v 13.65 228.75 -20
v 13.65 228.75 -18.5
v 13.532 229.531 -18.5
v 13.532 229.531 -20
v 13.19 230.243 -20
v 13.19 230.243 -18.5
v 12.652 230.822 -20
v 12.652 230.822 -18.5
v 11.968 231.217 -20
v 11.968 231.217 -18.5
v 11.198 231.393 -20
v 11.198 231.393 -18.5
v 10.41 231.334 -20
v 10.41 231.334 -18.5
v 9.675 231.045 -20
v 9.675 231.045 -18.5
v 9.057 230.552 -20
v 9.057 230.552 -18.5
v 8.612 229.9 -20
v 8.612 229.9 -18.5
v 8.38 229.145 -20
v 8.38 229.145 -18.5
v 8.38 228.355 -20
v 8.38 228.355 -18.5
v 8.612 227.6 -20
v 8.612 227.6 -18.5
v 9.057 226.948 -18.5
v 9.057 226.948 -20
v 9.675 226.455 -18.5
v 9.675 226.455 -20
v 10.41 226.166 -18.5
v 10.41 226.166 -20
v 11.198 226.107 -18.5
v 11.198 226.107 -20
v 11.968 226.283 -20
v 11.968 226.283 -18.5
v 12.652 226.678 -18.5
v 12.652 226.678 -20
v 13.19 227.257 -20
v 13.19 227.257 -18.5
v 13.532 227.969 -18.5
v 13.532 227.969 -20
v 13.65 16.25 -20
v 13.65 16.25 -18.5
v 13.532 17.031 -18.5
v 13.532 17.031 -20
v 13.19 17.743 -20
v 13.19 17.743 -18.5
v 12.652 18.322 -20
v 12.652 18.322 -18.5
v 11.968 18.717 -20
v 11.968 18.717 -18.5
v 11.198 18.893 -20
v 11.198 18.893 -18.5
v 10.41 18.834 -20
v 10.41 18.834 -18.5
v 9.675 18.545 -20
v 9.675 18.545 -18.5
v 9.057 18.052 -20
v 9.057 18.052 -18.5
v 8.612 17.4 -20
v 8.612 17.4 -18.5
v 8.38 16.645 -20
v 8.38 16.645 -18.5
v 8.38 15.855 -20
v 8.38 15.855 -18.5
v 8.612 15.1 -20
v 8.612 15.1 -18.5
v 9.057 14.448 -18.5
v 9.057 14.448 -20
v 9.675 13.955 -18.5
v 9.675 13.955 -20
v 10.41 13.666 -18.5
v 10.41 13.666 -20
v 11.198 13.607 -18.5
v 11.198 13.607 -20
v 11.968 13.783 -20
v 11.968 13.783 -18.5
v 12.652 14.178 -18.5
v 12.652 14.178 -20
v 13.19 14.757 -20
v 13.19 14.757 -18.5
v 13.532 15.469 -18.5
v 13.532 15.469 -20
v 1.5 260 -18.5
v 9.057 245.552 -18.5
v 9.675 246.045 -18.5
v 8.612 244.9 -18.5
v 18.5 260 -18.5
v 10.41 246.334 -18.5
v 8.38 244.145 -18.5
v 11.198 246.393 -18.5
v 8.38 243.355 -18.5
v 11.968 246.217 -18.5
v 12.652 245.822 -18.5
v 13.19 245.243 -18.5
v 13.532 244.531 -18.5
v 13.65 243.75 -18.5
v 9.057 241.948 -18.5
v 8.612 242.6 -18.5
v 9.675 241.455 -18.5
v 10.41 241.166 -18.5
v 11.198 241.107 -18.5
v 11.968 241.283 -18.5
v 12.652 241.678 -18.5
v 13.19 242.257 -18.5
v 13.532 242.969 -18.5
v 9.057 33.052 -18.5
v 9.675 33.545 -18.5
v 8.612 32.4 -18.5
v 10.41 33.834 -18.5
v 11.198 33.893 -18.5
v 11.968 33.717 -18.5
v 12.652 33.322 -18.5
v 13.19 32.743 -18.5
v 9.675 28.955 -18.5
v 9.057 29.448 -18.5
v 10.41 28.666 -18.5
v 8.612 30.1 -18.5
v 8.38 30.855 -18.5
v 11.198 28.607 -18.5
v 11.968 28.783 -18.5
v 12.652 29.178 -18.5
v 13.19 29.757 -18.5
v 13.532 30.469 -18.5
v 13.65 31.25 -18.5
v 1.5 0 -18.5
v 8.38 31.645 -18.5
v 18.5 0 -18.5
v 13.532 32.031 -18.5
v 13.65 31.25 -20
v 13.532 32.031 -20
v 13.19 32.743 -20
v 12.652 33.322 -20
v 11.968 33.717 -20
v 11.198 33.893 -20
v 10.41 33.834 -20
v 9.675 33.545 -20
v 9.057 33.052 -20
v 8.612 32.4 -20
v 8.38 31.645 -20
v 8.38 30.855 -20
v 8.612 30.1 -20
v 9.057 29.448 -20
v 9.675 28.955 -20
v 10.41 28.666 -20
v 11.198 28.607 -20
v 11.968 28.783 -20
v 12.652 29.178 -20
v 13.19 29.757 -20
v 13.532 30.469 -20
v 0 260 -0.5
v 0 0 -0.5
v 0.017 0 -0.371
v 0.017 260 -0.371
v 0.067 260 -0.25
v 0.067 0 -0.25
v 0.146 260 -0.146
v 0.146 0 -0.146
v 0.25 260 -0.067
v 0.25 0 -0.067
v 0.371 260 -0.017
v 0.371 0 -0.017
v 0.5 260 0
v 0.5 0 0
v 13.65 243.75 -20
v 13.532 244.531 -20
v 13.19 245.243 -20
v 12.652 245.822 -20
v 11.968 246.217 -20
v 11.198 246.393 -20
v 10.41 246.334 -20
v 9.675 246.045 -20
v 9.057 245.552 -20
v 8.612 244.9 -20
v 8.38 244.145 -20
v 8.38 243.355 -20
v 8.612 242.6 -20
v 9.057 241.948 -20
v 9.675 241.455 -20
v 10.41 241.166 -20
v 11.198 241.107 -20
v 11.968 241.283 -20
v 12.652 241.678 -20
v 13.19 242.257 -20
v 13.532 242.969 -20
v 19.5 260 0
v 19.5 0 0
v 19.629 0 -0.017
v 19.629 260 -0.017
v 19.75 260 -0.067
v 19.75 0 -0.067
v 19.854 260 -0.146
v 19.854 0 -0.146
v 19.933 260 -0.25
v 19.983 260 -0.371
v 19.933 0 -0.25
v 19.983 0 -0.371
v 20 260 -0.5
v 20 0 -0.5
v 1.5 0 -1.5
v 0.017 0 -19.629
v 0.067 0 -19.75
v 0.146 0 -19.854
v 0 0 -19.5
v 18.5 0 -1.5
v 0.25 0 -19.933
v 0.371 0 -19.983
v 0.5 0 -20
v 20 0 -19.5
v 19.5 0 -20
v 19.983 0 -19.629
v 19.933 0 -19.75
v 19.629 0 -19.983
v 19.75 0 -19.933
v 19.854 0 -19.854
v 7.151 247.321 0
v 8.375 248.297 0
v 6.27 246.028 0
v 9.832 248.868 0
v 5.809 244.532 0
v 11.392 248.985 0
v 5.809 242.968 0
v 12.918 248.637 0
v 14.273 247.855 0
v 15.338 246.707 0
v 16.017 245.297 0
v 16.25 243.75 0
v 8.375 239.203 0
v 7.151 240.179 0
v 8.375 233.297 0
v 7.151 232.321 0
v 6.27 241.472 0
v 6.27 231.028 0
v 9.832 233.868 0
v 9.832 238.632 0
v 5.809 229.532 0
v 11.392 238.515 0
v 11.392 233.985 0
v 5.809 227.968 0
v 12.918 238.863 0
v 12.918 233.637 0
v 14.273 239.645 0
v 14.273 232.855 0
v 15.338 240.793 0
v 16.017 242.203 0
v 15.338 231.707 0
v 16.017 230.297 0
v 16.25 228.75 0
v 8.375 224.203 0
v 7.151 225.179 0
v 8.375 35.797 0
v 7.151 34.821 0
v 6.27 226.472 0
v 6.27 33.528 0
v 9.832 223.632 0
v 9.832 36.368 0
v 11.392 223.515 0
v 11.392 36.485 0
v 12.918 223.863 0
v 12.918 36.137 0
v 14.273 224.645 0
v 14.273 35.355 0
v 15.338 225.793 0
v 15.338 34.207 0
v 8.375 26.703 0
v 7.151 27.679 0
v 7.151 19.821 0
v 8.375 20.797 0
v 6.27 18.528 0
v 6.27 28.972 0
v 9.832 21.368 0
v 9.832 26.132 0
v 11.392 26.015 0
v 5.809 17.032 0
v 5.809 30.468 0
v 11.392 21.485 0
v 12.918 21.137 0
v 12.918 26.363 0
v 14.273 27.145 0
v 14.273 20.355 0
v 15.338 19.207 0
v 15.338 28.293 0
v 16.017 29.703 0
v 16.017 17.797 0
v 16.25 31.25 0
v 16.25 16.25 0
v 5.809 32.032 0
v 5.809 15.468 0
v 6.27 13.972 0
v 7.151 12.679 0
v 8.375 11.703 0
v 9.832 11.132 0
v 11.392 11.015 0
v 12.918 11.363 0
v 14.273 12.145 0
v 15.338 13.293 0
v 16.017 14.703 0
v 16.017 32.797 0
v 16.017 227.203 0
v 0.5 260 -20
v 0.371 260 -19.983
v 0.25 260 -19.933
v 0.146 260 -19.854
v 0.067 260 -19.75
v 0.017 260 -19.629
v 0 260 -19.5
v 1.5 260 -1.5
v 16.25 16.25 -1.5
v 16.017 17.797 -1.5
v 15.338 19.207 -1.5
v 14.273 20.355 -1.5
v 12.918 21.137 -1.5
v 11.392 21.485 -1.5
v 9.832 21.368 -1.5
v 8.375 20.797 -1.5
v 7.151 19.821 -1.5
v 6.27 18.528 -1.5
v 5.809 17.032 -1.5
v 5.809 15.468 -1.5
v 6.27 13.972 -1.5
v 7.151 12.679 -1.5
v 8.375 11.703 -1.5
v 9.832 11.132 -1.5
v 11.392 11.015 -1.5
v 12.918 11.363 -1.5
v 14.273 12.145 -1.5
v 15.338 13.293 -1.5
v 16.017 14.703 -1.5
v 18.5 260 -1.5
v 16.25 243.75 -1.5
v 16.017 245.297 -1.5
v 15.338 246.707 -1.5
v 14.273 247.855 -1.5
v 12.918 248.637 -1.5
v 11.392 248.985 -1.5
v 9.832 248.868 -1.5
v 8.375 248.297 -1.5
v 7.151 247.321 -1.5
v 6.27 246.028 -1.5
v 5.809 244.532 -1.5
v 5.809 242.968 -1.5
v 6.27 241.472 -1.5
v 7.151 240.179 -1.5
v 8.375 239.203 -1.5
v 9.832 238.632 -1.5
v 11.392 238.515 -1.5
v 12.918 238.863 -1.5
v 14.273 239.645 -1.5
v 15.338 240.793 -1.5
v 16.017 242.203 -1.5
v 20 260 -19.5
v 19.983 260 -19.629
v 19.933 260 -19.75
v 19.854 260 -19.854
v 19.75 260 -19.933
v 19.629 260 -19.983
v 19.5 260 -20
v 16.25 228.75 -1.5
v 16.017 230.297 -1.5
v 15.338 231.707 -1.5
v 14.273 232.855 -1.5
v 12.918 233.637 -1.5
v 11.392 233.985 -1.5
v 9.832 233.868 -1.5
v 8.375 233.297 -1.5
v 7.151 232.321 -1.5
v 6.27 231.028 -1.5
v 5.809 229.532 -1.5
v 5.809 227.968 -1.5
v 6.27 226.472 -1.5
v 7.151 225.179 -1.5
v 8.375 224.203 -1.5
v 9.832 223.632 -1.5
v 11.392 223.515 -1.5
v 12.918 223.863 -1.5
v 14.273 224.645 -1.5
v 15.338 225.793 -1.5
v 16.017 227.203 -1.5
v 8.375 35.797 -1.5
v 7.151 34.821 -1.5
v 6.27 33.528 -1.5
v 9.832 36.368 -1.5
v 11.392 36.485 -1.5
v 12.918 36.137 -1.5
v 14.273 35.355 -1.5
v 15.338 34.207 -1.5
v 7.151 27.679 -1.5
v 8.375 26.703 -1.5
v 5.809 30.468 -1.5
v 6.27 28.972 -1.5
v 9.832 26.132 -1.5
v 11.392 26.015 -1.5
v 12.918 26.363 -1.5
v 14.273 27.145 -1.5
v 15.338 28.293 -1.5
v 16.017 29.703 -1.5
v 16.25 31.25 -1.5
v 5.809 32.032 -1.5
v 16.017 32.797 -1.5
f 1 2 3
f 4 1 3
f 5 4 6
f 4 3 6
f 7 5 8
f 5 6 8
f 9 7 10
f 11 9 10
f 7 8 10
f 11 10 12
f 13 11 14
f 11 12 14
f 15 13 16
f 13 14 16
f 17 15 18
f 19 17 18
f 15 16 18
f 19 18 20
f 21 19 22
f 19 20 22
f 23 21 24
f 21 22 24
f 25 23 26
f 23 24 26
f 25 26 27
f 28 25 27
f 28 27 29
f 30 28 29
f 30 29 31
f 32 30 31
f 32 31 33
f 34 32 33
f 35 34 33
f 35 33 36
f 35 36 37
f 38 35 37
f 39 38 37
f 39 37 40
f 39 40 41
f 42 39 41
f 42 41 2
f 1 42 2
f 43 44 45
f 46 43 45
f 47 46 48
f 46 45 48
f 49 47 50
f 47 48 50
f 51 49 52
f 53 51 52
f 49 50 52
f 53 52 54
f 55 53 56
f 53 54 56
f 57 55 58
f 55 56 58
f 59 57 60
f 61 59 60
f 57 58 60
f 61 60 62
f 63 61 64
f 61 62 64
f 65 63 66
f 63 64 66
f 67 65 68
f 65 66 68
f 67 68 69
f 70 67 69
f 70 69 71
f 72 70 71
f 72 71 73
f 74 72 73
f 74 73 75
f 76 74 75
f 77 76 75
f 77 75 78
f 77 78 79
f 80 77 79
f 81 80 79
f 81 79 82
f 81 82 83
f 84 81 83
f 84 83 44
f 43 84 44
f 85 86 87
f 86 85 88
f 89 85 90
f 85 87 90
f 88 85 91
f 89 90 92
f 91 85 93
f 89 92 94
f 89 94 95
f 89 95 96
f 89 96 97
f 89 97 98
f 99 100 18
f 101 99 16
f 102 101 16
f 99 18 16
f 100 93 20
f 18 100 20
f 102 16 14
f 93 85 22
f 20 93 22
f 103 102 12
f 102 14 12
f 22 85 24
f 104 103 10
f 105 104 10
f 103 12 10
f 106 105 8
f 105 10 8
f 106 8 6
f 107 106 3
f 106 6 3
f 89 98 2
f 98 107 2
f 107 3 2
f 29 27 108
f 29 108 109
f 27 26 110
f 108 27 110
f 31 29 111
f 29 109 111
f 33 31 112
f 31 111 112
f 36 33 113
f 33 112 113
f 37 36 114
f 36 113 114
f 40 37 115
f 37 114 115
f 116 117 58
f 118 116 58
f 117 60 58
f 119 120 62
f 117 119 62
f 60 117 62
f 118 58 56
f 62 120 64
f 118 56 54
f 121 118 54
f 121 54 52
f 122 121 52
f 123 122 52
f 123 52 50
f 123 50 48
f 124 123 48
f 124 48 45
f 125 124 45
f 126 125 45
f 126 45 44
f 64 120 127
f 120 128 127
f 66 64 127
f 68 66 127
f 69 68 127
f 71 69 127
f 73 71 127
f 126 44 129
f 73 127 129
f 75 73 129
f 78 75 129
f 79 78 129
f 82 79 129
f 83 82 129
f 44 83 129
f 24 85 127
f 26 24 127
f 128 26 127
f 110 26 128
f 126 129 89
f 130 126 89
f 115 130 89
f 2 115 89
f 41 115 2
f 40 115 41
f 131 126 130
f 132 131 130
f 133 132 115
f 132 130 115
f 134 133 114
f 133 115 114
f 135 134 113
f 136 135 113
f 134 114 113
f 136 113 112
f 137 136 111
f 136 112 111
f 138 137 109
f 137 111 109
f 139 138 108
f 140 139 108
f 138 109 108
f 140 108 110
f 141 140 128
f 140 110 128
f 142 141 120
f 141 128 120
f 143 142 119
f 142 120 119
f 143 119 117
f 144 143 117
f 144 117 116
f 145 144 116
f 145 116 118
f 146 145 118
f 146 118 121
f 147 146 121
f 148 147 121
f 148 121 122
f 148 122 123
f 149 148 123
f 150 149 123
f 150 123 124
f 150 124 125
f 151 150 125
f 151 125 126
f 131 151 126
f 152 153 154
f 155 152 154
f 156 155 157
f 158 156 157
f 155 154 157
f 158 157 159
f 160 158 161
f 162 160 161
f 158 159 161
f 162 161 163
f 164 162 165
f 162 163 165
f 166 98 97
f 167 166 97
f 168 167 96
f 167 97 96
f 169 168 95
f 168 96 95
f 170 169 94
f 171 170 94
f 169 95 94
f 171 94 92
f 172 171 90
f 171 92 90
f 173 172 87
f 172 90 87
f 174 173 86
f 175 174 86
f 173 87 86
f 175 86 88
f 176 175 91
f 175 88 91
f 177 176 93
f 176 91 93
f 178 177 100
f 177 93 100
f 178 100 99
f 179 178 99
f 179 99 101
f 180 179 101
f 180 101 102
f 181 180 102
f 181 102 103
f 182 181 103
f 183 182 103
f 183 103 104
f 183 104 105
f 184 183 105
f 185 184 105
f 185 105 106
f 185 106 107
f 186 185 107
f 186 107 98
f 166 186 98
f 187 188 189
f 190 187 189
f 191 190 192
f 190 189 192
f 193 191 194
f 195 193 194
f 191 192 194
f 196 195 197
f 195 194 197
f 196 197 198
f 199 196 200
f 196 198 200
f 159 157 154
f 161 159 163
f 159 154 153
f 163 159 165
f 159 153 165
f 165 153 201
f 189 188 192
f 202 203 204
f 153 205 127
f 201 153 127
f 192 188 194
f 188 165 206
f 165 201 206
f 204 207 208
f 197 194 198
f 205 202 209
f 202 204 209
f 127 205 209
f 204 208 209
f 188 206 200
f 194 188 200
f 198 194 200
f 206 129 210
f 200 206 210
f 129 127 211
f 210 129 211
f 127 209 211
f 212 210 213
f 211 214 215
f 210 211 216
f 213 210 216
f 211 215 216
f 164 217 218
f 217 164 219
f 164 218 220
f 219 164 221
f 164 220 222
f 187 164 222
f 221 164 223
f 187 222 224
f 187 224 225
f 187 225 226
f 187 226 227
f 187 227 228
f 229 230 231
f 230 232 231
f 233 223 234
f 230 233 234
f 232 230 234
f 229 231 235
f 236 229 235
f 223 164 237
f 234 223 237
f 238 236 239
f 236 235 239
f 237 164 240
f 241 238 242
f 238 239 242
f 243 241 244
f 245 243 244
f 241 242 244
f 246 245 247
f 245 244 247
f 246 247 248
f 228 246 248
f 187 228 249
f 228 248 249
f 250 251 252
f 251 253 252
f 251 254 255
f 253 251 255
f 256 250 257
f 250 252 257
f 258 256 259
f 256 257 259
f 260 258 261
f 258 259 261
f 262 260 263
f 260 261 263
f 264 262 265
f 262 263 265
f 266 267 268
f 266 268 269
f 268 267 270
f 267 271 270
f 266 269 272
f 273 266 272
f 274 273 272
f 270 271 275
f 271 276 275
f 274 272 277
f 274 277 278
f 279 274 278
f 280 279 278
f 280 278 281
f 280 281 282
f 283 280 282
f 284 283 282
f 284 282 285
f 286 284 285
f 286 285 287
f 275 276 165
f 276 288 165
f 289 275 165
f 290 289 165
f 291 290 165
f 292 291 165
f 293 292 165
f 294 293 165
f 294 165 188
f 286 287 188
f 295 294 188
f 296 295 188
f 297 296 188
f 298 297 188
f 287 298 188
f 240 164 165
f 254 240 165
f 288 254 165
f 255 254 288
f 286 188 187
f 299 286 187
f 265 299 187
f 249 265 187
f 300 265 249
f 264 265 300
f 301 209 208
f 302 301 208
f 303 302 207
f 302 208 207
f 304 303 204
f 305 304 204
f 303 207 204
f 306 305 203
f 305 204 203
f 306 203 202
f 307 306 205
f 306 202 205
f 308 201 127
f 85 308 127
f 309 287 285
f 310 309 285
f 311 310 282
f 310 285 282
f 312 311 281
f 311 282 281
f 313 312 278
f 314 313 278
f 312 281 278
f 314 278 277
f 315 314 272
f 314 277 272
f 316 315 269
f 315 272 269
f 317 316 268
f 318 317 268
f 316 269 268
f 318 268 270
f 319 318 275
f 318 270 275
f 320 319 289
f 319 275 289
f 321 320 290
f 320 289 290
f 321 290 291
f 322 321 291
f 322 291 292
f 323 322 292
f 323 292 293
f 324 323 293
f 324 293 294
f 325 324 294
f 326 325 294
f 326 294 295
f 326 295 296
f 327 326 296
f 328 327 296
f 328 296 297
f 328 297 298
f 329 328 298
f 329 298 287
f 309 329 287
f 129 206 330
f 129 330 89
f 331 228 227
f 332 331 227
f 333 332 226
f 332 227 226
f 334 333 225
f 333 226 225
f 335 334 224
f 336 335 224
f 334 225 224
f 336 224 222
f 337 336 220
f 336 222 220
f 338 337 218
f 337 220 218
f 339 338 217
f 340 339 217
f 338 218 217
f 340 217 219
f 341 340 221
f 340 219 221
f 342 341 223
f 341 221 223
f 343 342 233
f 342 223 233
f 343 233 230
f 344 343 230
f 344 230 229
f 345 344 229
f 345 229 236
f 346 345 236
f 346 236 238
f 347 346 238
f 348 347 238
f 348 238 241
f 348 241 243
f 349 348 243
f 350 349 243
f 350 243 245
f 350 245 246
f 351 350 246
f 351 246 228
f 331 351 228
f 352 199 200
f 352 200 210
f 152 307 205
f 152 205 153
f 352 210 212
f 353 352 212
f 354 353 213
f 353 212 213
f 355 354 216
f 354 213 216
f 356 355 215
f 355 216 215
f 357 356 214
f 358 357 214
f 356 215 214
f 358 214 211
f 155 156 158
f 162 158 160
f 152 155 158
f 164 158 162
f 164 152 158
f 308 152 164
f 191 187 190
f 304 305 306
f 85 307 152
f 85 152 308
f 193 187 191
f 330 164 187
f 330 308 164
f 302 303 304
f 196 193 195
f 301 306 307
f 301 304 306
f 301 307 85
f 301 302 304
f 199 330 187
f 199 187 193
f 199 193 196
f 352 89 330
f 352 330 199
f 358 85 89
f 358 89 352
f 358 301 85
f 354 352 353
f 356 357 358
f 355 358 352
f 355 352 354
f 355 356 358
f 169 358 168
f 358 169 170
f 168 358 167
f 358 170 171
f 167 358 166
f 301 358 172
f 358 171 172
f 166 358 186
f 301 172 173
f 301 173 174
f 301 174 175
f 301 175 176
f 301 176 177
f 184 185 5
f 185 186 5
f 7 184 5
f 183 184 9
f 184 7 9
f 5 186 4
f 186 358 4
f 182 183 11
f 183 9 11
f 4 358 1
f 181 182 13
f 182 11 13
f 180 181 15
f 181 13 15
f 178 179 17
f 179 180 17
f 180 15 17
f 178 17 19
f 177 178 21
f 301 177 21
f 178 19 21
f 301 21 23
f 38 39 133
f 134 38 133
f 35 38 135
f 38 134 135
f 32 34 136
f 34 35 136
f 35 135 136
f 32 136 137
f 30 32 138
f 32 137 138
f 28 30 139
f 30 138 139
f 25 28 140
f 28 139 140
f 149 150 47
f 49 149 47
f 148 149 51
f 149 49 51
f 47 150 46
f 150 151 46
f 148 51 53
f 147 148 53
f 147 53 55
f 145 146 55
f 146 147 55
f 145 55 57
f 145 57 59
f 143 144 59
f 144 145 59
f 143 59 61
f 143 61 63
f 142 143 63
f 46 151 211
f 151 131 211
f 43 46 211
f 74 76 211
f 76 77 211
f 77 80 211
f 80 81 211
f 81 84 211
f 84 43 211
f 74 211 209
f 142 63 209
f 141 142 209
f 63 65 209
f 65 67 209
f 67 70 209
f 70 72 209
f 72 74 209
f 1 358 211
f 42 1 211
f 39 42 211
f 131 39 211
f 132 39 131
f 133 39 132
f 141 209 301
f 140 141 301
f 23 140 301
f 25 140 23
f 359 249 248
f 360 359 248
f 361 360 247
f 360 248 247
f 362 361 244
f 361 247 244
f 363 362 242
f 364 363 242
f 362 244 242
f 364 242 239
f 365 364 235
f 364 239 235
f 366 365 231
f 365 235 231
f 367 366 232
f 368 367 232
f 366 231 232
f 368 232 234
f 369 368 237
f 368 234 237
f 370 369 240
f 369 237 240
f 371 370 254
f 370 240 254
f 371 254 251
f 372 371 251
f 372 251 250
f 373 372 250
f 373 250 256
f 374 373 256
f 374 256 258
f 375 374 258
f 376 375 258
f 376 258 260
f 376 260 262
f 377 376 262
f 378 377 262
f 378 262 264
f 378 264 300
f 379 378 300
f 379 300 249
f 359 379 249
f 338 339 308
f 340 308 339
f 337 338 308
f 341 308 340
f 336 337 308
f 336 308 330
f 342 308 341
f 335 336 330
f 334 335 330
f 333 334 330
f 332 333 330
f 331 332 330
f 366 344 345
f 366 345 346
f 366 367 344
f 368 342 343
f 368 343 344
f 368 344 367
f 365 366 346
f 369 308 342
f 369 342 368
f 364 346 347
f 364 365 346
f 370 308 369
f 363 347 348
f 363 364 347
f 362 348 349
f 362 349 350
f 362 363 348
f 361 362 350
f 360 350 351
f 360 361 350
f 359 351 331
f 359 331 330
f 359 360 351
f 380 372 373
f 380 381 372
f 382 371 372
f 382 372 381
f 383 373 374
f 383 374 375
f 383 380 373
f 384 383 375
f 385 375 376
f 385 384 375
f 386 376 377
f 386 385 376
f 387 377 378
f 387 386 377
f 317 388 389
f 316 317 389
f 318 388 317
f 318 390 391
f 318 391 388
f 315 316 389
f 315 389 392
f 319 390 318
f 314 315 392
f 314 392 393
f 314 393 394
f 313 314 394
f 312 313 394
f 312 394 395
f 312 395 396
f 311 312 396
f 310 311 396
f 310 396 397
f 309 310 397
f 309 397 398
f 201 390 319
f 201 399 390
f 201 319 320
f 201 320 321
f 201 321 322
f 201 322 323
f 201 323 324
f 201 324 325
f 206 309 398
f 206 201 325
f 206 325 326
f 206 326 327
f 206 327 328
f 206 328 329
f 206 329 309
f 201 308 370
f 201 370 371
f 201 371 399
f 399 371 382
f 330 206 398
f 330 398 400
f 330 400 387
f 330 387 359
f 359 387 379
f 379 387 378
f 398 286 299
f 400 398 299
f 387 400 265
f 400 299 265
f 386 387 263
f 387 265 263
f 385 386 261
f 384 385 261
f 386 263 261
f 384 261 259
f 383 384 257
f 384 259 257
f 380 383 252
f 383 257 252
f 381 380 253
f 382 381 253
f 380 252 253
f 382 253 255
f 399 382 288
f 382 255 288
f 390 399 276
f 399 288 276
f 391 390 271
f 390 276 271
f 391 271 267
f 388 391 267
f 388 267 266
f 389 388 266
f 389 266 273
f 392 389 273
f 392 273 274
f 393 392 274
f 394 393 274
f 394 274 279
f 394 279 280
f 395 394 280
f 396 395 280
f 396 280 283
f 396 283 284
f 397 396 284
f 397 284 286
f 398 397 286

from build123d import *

# Parameters (mm, degrees)
SKETCH1_W           = 17
SKETCH1_H           = 17
BOSS_EXTRUDE1_DEPTH = 260
SKETCH2_R           = 2.65
CUT_EXTRUDE1_DEPTH  = 262.533936612
SKETCH3_R           = 5.25
CUT_EXTRUDE2_DEPTH  = 10


with BuildPart() as part:
    # Sketch1 → Boss-Extrude1 (new body)
    with BuildSketch(Plane(origin=(0, 0, 0), x_dir=(1, 0, 0), z_dir=(0, 1, 0))):
        with BuildLine():
            Line((0.5, 0), (19.5, 0))
            ThreePointArc((19.5, 0), (19.853553391, 0.146446609), (20, 0.5))
            Line((20, 0.5), (20, 19.5))
            ThreePointArc((20, 19.5), (19.853553391, 19.853553391), (19.5, 20))
            Line((19.5, 20), (0.5, 20))
            ThreePointArc((0.5, 20), (0.146446609, 19.853553391), (0, 19.5))
            Line((0, 19.5), (0, 0.5))
            ThreePointArc((0, 0.5), (0.146446609, 0.146446609), (0.5, 0))
        make_face()
        with Locations((10, 10)):
            Rectangle(SKETCH1_W, SKETCH1_H, mode=Mode.SUBTRACT)
    extrude(amount=BOSS_EXTRUDE1_DEPTH)

    # Sketch2 → Cut-Extrude1 (cut, through all)
    with BuildSketch(Plane.XY):
        with Locations((11, 243.75)):
            Circle(SKETCH2_R)
        with Locations((11, 228.75)):
            Circle(SKETCH2_R)
        with Locations((11, 31.25)):
            Circle(SKETCH2_R)
        with Locations((11, 16.25)):
            Circle(SKETCH2_R)
    extrude(amount=-CUT_EXTRUDE1_DEPTH, mode=Mode.SUBTRACT)

    # Sketch3 → Cut-Extrude2 (cut)
    with BuildSketch(Plane.XY):
        with Locations((11, 243.75)):
            Circle(SKETCH3_R)
        with Locations((11, 228.75)):
            Circle(SKETCH3_R)
        with Locations((11, 31.25)):
            Circle(SKETCH3_R)
        with Locations((11, 16.25)):
            Circle(SKETCH3_R)
    extrude(amount=-CUT_EXTRUDE2_DEPTH, mode=Mode.SUBTRACT)


solid = part.part
